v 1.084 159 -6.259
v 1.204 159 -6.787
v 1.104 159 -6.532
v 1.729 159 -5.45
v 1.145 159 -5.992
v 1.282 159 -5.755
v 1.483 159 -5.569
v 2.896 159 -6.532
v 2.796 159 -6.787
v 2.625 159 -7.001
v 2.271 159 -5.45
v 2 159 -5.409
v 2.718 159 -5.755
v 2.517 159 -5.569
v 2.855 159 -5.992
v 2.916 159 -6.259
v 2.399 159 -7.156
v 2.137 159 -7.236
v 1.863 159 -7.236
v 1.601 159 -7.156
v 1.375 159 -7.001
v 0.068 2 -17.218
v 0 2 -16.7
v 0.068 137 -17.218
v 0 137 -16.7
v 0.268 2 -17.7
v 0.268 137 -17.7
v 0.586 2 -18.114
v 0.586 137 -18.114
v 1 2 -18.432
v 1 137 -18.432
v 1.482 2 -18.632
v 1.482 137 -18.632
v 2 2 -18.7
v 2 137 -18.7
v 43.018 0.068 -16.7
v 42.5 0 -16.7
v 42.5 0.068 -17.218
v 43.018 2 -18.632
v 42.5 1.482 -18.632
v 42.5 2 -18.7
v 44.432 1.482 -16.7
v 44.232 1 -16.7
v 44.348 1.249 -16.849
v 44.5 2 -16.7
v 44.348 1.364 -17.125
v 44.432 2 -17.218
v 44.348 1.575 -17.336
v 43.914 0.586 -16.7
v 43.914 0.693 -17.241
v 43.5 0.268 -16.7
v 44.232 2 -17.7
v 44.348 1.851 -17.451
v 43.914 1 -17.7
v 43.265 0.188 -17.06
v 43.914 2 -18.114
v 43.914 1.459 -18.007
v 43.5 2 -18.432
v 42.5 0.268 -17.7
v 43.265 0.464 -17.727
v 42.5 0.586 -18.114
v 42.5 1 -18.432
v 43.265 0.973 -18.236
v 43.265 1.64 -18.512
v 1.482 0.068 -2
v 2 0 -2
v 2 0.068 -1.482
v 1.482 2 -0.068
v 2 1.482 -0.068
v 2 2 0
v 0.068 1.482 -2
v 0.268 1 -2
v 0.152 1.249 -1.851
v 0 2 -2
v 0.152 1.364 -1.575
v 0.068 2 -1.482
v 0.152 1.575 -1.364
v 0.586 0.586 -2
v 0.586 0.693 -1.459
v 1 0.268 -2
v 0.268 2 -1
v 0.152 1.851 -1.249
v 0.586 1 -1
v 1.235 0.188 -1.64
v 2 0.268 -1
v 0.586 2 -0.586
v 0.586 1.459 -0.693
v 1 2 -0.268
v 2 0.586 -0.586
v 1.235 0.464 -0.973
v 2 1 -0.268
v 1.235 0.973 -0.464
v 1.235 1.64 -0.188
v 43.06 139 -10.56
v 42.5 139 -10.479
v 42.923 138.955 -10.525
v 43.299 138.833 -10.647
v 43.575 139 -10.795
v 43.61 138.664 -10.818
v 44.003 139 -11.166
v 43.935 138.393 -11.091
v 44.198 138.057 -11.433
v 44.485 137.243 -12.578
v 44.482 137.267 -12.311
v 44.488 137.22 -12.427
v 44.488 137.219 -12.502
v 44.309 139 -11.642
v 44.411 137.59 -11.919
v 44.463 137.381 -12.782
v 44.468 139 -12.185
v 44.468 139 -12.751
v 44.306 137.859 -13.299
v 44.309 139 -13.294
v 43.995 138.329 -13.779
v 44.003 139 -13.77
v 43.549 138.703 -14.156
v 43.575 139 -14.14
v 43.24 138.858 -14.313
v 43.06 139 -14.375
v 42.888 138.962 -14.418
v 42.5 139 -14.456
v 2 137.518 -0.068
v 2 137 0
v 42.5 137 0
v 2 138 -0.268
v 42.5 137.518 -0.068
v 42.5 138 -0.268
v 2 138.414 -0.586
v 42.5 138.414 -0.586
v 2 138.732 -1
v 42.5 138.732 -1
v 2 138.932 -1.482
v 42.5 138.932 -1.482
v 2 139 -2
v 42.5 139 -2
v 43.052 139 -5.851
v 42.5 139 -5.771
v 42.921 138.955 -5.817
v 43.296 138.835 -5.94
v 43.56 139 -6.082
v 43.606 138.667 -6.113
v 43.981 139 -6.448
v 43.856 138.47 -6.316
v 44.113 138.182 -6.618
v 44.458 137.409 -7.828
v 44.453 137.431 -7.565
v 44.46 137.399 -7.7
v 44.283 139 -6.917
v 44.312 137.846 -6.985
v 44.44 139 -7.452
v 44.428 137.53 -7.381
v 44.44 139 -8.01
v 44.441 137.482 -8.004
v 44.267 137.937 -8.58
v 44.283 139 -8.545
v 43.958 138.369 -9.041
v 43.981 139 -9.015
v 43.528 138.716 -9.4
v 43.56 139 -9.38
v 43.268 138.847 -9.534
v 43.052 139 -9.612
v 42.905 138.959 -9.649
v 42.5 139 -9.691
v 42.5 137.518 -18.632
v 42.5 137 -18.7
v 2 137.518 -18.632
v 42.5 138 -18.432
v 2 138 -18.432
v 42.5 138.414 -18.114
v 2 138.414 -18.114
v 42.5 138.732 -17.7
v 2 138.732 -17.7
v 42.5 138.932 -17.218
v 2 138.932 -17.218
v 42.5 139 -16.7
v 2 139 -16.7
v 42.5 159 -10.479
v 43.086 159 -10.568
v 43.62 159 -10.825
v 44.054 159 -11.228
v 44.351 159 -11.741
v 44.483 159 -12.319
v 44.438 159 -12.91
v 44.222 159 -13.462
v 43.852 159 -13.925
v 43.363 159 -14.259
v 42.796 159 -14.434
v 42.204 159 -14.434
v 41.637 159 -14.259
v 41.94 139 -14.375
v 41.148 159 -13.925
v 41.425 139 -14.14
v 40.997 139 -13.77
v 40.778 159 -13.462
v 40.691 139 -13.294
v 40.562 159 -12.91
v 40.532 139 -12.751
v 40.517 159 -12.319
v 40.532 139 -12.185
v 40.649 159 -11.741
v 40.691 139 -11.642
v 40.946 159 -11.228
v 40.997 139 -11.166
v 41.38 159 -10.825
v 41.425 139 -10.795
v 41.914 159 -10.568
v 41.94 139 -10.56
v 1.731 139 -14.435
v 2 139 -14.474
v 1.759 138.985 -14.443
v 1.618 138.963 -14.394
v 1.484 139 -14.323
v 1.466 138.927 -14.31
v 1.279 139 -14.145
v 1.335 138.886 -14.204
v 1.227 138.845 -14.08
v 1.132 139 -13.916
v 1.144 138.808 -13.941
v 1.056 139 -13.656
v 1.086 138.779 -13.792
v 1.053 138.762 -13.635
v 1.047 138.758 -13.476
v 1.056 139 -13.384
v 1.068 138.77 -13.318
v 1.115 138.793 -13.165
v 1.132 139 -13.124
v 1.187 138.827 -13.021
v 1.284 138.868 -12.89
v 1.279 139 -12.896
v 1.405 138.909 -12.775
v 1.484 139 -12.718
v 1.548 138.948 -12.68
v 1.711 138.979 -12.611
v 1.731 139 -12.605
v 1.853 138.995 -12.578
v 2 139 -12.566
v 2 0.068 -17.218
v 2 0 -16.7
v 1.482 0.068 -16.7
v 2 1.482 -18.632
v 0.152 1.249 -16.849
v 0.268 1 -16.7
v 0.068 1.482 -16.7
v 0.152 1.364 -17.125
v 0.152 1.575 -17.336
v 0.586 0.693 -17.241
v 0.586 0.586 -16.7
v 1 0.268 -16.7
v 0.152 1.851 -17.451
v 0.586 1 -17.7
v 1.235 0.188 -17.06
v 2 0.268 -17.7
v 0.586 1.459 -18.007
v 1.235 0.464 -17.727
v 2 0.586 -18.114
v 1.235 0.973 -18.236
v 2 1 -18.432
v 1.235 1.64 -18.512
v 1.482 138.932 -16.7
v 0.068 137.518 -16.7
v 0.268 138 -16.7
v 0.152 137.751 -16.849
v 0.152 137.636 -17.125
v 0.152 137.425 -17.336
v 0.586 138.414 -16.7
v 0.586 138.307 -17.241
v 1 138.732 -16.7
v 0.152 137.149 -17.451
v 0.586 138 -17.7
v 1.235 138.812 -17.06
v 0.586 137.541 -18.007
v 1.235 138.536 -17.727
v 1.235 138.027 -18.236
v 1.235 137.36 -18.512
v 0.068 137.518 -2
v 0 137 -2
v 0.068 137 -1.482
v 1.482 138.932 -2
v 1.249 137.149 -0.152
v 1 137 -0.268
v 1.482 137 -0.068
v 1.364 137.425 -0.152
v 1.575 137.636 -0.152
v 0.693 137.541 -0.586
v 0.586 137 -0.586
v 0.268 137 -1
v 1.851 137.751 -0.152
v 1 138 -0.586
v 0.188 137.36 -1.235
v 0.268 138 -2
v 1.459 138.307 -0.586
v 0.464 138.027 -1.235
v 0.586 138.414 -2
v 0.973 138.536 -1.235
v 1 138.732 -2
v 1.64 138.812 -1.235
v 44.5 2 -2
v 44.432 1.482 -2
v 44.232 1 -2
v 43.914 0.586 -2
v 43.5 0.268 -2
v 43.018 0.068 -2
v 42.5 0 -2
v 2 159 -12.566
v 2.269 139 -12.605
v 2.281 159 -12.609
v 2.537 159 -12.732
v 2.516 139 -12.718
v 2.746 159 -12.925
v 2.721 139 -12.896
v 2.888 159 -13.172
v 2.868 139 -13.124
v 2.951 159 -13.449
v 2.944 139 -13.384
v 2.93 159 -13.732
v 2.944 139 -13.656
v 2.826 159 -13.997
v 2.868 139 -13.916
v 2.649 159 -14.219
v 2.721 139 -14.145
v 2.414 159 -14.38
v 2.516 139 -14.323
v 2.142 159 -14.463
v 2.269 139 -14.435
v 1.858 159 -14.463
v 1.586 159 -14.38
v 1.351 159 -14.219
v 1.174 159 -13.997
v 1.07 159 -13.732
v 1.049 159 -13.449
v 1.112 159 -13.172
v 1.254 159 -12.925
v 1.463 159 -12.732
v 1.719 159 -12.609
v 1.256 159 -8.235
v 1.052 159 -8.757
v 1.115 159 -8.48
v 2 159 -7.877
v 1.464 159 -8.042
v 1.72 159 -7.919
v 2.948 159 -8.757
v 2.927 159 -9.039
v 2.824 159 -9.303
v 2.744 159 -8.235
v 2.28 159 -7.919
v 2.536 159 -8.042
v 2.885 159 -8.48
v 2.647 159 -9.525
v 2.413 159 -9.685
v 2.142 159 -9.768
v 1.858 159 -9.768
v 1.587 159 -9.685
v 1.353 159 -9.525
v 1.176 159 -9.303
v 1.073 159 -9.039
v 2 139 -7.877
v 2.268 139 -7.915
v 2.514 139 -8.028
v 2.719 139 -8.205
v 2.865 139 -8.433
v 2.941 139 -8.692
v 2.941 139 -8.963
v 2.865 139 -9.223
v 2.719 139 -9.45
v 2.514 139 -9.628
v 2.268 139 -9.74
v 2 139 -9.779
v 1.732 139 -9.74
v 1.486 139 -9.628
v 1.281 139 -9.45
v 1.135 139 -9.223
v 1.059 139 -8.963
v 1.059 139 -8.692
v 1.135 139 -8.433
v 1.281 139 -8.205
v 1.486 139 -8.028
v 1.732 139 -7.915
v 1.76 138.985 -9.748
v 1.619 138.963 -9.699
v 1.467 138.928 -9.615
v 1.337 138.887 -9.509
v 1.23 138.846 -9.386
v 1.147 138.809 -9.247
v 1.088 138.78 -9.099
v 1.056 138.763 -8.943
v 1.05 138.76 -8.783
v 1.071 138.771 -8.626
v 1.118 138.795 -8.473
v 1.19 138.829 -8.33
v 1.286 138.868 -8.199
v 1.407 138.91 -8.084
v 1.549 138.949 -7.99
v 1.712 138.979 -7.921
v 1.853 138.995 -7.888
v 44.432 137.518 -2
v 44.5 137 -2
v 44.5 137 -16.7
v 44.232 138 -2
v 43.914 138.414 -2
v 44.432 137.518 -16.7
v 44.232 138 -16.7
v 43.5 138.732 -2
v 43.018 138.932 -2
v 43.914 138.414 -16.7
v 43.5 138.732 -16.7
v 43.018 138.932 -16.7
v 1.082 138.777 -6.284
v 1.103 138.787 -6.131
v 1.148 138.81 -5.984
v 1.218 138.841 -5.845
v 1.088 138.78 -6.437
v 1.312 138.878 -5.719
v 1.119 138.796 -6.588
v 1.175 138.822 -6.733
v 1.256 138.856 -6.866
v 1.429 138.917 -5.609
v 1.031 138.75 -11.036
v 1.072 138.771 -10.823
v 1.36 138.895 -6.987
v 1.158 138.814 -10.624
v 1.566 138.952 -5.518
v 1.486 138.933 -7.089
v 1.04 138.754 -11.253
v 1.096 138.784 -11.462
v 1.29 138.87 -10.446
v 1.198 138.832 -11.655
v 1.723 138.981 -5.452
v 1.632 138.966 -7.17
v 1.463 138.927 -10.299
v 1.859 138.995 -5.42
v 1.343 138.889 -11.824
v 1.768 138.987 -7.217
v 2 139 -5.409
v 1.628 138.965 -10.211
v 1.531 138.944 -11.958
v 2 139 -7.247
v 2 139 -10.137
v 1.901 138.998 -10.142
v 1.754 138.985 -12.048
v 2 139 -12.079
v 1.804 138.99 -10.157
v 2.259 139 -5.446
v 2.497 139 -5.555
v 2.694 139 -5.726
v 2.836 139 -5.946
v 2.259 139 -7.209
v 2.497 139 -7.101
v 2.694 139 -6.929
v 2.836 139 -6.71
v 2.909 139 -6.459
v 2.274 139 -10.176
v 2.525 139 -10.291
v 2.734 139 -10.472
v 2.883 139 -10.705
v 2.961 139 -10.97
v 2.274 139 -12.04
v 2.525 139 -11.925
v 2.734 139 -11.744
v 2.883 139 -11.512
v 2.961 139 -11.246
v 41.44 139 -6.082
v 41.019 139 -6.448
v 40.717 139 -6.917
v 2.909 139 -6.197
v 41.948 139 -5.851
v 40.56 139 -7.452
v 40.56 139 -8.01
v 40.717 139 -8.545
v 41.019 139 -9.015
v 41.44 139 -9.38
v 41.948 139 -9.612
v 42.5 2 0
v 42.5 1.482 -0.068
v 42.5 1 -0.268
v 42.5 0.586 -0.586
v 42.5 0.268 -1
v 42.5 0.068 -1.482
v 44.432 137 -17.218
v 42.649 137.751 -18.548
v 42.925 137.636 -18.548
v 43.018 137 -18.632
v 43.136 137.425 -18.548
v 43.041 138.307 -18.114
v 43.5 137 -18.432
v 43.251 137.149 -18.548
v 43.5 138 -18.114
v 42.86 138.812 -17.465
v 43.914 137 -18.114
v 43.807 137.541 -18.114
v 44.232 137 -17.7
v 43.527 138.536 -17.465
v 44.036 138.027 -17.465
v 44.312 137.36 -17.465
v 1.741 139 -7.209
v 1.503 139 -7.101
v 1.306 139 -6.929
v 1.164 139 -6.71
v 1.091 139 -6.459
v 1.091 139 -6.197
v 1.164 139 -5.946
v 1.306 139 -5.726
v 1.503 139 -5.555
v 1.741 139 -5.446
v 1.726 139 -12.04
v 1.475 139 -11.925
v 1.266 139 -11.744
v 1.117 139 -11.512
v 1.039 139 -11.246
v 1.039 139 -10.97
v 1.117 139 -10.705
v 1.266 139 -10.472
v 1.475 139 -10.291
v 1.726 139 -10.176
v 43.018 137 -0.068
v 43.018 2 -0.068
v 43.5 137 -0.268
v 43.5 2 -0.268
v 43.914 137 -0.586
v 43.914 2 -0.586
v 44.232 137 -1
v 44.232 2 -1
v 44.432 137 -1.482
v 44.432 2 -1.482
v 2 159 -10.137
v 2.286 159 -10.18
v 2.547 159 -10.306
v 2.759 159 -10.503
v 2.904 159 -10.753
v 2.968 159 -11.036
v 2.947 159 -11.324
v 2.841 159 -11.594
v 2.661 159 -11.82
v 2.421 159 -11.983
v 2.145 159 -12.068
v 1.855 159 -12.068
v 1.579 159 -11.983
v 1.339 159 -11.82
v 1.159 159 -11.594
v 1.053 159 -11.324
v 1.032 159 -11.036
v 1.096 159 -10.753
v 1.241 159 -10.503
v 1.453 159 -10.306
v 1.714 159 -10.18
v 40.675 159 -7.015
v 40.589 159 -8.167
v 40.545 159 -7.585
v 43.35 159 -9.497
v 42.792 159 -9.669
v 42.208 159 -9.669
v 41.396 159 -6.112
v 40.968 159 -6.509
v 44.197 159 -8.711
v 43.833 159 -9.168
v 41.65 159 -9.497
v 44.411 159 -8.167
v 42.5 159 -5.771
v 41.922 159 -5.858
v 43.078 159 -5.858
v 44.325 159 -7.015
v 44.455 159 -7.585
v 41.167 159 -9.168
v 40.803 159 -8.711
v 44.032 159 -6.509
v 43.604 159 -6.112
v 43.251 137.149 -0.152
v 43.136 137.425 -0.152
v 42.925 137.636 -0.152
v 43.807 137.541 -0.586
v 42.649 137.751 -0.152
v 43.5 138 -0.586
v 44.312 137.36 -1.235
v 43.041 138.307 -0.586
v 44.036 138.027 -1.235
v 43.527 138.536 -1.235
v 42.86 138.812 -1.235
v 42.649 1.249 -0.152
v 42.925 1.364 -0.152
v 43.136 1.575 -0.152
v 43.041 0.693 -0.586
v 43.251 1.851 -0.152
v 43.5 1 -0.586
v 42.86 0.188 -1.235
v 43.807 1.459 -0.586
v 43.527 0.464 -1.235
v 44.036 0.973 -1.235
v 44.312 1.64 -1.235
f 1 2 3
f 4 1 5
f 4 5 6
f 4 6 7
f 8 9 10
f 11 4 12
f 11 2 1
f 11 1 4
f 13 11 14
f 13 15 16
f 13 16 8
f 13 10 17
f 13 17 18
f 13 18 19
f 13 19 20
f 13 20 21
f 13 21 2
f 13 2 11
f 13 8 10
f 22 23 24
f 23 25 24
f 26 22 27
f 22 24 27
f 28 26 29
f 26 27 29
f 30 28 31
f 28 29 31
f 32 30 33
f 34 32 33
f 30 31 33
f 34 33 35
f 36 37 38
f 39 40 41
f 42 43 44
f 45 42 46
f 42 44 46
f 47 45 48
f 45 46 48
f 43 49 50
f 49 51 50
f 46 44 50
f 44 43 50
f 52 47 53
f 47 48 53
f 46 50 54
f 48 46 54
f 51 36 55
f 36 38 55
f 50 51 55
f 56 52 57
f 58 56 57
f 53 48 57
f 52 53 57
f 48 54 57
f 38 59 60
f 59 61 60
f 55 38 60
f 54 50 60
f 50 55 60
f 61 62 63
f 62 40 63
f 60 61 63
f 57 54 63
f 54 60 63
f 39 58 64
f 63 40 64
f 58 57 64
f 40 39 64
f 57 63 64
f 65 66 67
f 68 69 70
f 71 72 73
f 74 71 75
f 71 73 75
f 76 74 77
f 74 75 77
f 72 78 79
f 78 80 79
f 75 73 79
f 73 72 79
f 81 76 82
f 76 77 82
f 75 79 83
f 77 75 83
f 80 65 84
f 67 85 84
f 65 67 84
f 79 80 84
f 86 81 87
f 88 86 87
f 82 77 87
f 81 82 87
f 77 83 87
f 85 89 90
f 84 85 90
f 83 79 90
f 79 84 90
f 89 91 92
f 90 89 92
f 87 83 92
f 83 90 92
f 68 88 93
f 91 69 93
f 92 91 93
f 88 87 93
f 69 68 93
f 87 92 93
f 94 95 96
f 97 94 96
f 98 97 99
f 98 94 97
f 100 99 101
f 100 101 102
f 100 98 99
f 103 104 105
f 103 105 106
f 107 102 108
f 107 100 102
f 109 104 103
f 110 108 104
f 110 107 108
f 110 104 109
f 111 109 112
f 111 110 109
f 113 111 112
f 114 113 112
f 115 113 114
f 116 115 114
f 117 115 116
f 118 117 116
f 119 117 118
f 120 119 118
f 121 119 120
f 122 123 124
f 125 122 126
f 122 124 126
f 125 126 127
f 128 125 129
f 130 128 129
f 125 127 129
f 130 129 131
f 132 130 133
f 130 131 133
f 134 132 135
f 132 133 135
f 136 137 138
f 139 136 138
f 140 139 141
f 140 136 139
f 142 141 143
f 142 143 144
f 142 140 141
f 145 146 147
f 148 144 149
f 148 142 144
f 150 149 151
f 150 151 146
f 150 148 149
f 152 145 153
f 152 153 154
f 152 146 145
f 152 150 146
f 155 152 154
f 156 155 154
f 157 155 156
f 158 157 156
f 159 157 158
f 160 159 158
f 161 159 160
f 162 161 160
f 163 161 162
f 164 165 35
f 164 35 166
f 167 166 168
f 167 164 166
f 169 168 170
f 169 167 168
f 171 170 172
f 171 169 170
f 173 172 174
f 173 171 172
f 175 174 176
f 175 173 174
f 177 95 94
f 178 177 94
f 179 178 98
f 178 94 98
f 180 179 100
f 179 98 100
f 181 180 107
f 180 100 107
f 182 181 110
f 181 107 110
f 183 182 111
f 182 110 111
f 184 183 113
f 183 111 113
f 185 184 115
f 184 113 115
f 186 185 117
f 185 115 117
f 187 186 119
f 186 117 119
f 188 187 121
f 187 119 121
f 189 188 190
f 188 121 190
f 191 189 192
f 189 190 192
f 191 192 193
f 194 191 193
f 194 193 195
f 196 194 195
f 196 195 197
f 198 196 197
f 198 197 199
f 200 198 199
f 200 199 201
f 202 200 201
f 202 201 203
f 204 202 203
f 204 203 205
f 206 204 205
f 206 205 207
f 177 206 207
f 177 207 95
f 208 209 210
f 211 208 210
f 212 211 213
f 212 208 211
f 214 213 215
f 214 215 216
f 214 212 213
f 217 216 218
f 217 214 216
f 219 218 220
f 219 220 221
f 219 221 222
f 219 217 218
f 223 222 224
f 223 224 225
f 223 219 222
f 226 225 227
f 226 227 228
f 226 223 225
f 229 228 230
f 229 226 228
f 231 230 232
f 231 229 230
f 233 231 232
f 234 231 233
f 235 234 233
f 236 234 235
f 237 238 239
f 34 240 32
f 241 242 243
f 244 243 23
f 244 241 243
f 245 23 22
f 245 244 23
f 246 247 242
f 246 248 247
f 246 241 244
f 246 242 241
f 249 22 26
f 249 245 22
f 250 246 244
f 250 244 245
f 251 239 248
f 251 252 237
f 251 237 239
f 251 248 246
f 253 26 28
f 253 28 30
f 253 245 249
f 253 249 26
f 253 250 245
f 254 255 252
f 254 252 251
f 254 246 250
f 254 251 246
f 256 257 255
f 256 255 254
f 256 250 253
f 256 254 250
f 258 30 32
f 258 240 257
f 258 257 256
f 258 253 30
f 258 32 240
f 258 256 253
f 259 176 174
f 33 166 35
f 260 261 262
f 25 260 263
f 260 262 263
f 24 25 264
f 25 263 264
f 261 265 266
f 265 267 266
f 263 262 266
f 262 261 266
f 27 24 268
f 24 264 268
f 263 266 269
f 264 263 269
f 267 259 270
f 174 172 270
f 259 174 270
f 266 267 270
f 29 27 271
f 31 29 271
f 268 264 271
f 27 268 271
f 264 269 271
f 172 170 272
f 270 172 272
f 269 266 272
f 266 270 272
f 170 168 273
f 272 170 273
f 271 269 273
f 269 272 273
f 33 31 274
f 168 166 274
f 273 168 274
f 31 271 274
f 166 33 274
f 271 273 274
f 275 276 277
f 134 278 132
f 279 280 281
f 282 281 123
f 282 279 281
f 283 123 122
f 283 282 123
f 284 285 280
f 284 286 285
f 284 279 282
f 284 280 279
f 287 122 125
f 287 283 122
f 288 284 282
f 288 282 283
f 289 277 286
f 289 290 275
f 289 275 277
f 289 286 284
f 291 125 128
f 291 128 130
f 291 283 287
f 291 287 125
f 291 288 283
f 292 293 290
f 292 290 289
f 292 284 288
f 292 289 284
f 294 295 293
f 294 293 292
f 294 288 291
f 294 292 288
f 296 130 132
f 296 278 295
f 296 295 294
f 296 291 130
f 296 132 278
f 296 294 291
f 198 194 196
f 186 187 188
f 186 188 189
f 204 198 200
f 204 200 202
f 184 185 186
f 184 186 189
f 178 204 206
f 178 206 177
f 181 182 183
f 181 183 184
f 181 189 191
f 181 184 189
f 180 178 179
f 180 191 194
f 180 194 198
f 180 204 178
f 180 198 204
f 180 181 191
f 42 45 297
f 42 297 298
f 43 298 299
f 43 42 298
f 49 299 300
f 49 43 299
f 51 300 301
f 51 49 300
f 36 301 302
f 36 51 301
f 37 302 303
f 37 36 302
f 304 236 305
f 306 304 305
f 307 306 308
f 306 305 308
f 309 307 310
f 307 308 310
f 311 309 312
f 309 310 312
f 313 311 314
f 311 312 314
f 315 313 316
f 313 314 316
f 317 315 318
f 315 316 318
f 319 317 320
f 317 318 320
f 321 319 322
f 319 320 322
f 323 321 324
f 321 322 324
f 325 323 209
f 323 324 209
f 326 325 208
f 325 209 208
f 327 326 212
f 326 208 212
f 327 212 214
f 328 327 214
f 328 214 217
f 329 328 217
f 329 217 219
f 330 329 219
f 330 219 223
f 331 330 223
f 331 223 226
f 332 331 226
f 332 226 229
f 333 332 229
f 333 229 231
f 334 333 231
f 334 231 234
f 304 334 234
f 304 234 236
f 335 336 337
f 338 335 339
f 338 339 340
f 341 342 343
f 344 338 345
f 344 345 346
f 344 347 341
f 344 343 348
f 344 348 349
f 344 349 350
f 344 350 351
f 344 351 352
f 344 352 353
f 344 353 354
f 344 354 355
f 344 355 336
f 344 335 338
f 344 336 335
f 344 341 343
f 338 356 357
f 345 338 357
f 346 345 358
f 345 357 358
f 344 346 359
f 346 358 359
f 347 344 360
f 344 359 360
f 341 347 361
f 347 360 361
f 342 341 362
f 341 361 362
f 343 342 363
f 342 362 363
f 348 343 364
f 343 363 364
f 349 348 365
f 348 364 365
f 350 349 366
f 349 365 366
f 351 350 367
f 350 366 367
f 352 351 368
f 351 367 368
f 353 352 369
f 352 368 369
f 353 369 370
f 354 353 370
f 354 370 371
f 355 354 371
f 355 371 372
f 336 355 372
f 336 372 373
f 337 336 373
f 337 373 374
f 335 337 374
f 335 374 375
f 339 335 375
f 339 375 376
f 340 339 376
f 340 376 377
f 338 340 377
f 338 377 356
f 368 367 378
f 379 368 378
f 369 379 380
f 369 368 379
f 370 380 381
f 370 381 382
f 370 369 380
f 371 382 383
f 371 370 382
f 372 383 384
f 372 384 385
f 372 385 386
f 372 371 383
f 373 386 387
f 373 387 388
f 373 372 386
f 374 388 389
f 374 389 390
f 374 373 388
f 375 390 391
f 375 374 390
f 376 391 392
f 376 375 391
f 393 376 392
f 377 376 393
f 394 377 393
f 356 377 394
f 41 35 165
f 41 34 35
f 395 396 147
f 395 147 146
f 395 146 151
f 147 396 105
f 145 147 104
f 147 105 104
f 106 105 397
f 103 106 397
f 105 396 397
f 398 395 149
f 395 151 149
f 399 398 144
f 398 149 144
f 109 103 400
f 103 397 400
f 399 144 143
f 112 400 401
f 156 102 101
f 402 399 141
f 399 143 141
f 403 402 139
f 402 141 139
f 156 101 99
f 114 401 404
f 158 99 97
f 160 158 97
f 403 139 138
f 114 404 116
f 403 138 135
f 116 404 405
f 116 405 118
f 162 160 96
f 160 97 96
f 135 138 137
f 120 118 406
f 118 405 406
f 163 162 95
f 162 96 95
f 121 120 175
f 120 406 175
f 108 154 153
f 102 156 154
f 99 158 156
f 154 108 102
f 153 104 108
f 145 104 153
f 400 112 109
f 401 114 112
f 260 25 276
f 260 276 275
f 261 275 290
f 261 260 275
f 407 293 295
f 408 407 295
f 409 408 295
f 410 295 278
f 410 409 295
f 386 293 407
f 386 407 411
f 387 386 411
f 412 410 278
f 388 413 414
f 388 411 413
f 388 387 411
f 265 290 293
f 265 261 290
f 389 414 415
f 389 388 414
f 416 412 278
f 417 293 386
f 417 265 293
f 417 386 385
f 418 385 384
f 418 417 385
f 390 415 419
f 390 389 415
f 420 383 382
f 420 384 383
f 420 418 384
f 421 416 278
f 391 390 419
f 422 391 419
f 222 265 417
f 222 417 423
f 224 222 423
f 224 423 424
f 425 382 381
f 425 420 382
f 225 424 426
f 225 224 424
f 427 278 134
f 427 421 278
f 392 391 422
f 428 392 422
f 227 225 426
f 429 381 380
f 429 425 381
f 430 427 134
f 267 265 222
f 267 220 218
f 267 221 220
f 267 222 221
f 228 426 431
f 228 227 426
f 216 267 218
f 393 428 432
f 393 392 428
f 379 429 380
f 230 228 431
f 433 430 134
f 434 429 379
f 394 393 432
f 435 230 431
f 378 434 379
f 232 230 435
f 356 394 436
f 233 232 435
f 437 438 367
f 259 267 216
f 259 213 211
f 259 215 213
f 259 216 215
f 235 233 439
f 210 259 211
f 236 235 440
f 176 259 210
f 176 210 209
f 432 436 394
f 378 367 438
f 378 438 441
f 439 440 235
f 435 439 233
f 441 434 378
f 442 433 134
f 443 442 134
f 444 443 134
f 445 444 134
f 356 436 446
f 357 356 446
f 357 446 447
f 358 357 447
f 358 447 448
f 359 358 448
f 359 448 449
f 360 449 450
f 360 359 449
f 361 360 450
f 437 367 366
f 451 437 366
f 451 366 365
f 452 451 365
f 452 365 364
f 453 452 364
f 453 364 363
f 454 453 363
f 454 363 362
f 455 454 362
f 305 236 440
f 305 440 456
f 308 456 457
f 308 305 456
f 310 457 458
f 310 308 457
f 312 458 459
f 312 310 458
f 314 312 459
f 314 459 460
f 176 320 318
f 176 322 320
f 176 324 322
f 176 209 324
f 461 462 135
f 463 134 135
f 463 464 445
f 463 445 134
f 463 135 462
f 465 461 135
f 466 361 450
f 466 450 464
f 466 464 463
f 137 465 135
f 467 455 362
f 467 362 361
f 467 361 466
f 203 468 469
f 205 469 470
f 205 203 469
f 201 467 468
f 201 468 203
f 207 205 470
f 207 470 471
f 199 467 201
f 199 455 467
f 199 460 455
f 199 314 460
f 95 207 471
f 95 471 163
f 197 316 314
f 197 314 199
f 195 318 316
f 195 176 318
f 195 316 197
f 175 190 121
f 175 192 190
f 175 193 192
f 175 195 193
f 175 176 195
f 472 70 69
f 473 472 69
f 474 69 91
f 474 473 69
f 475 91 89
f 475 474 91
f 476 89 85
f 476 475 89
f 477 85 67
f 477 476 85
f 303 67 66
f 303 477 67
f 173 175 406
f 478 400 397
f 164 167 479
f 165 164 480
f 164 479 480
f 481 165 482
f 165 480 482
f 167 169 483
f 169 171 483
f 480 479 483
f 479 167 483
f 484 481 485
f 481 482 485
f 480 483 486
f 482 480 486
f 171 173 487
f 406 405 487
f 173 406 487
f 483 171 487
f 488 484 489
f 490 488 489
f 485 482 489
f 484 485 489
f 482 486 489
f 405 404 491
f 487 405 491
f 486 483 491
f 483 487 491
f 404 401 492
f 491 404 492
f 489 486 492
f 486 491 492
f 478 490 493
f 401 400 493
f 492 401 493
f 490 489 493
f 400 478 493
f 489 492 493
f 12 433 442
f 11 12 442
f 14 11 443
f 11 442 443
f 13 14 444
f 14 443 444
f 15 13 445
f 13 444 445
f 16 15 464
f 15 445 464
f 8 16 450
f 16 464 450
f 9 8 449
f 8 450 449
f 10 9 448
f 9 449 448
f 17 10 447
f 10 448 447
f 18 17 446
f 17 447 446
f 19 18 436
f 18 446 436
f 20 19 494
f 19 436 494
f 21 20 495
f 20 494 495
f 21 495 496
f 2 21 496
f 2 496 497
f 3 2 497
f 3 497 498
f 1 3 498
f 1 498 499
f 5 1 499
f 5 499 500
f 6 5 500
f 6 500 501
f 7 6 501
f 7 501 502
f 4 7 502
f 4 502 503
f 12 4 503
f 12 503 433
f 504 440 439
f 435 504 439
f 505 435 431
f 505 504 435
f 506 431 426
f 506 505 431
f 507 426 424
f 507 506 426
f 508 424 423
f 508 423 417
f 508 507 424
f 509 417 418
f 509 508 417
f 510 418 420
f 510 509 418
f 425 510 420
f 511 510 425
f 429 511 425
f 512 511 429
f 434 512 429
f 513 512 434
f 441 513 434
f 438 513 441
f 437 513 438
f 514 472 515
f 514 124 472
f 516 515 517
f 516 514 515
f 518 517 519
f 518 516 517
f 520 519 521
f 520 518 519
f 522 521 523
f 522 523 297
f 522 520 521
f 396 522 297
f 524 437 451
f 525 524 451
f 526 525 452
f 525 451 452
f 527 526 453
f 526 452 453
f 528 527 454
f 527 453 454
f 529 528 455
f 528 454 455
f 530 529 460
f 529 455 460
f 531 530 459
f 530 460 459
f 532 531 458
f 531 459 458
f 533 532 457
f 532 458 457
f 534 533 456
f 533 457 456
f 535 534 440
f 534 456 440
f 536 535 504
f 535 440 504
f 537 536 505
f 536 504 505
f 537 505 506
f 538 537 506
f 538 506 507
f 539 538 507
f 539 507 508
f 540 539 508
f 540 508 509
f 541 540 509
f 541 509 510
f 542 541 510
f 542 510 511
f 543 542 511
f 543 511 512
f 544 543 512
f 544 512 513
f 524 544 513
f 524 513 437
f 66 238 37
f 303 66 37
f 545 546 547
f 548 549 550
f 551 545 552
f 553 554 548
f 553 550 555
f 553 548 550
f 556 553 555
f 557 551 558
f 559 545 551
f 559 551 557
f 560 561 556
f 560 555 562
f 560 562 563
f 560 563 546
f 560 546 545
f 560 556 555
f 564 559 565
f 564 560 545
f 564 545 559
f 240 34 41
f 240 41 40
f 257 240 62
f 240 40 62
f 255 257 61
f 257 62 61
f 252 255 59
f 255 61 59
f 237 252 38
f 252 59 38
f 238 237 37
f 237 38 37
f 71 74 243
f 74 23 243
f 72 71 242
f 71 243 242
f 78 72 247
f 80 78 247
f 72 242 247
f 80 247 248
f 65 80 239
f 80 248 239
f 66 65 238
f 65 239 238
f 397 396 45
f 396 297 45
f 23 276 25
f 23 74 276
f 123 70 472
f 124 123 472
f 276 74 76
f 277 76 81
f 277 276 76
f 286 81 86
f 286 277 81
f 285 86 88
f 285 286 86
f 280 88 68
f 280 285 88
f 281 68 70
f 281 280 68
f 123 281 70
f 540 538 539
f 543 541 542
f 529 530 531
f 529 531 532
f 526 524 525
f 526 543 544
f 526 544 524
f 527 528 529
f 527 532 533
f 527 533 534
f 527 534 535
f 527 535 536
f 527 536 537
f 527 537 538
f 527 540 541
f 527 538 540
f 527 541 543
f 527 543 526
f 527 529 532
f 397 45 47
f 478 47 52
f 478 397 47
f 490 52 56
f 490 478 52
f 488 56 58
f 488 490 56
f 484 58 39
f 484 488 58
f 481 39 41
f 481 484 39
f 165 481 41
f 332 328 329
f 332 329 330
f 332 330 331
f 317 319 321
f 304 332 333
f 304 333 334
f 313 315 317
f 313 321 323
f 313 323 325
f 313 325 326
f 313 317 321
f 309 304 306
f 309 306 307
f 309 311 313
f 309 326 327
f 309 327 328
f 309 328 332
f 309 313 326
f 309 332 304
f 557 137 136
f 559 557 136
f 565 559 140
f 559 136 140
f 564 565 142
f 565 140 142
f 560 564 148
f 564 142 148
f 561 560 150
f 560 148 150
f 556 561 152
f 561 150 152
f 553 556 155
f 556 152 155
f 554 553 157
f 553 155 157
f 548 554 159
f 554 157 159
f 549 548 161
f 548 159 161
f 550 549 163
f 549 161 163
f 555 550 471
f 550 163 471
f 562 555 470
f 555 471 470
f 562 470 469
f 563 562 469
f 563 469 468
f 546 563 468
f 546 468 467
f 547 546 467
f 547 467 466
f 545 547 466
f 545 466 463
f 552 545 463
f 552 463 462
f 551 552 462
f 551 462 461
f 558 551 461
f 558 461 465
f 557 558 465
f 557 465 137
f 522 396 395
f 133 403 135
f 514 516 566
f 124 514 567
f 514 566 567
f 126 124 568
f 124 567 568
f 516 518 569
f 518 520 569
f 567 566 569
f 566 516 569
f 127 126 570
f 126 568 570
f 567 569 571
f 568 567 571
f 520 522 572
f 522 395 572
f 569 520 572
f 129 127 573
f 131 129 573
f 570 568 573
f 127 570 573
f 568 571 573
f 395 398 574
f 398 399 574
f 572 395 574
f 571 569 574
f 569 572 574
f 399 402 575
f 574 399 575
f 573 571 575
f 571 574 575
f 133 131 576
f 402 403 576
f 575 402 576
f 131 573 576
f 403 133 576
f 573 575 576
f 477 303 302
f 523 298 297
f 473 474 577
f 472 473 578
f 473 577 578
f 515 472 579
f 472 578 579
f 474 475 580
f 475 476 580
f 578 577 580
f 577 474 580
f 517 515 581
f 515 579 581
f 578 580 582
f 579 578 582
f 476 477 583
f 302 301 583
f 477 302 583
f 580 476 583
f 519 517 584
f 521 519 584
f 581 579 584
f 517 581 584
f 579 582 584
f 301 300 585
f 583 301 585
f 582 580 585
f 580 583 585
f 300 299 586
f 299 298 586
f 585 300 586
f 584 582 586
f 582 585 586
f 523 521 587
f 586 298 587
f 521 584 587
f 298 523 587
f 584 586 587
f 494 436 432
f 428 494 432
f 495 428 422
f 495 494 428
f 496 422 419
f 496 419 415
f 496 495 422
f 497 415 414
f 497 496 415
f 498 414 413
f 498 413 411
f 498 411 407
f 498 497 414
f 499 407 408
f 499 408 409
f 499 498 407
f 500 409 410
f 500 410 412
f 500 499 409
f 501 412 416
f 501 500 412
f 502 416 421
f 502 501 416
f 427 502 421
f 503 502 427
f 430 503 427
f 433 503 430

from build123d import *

# Parameters (mm, degrees)
SKETCH1_W                       = 44.5
SKETCH1_H                       = 18.7
BOSS_EXTRUDE1_DEPTH             = 139
FILLET1_R                       = 2
SKETCH2_R                       = 1.960015311
SKETCH2_R_2                     = 1.988264752
SKETCH2_R_3                     = 0.918642691
SKETCH2_R_4                     = 0.97117112
SKETCH2_R_5                     = 0.953860003
SKETCH2_R_6                     = 0.951024876
BOSS_EXTRUDE2_DEPTH             = 20
BOSS_EXTRUDE2_DIRECTION_2_REACH = 149.143


with BuildPart() as part:
    # Sketch1 → Boss-Extrude1 (new body)
    with BuildSketch(Plane(origin=(0, 0, 0), x_dir=(1, 0, 0), z_dir=(0, 1, 0))):
        with Locations((22.25, 9.35)):
            Rectangle(SKETCH1_W, SKETCH1_H)
    extrude(amount=BOSS_EXTRUDE1_DEPTH)

    # Fillet1
    fillet1_edges = [part.edges().sort_by_distance(p)[0] for p in [
        (44.5, 139, -9.35),
        (22.25, 139, -18.7),
        (0, 139, -9.35),
        (22.25, 0, -18.7),
        (44.5, 0, -9.35),
        (22.25, 0, 0),
        (0, 0, -9.35),
        (0, 69.5, -18.7),
        (44.5, 69.5, -18.7),
        (44.5, 69.5, 0),
        (0, 69.5, 0),
        (22.25, 139, 0),
    ]]
    fillet(fillet1_edges, radius=FILLET1_R)

    # Sketch2 → Boss-Extrude2 (add)
    with BuildSketch(Plane(origin=(0, 139, 0), x_dir=(1, 0, 0), z_dir=(0, 1, 0))):
        with Locations(Location((42.5, 7.731273805, 0), (0, 0, 270))):
            Circle(SKETCH2_R)
        with Locations(Location((42.5, 12.467660333, 0), (0, 0, 270))):
            Circle(SKETCH2_R_2)
        with Locations(Location((2, 6.327900019, 0), (0, 0, 270))):
            Circle(SKETCH2_R_3)
        with Locations(Location((2, 11.108141978, 0), (0, 0, 270))):
            Circle(SKETCH2_R_4)
        with Locations(Location((2, 13.520190672, 0), (0, 0, 270))):
            Circle(SKETCH2_R_5)
        with Locations(Location((2, 8.827659575, 0), (0, 0, 270))):
            Circle(SKETCH2_R_6)
    extrude(amount=BOSS_EXTRUDE2_DEPTH)

    # Sketch2 → Boss-Extrude2 direction 2 (add, up to next)
    with BuildSketch(Plane(origin=(0, 139, 0), x_dir=(1, 0, 0), z_dir=(0, 1, 0)), mode=Mode.PRIVATE) as boss_extrude2_direction_2_sk1:
        with Locations(Location((42.5, 7.731273805, 0), (0, 0, 270))):
            Circle(SKETCH2_R)
    boss_extrude2_direction_2_tool1 = extrude(boss_extrude2_direction_2_sk1.sketch, amount=-BOSS_EXTRUDE2_DIRECTION_2_REACH, mode=Mode.PRIVATE) - part.part
    # Sketch2 → Boss-Extrude2 direction 2 (add, up to next)
    with BuildSketch(Plane(origin=(0, 139, 0), x_dir=(1, 0, 0), z_dir=(0, 1, 0)), mode=Mode.PRIVATE) as boss_extrude2_direction_2_sk2:
        with Locations(Location((42.5, 12.467660333, 0), (0, 0, 270))):
            Circle(SKETCH2_R_2)
    boss_extrude2_direction_2_tool2 = extrude(boss_extrude2_direction_2_sk2.sketch, amount=-BOSS_EXTRUDE2_DIRECTION_2_REACH, mode=Mode.PRIVATE) - part.part
    # Sketch2 → Boss-Extrude2 direction 2 (add, up to next)
    with BuildSketch(Plane(origin=(0, 139, 0), x_dir=(1, 0, 0), z_dir=(0, 1, 0)), mode=Mode.PRIVATE) as boss_extrude2_direction_2_sk3:
        with Locations(Location((2, 6.327900019, 0), (0, 0, 270))):
            Circle(SKETCH2_R_3)
    boss_extrude2_direction_2_tool3 = extrude(boss_extrude2_direction_2_sk3.sketch, amount=-BOSS_EXTRUDE2_DIRECTION_2_REACH, mode=Mode.PRIVATE) - part.part
    # Sketch2 → Boss-Extrude2 direction 2 (add, up to next)
    with BuildSketch(Plane(origin=(0, 139, 0), x_dir=(1, 0, 0), z_dir=(0, 1, 0)), mode=Mode.PRIVATE) as boss_extrude2_direction_2_sk4:
        with Locations(Location((2, 11.108141978, 0), (0, 0, 270))):
            Circle(SKETCH2_R_4)
    boss_extrude2_direction_2_tool4 = extrude(boss_extrude2_direction_2_sk4.sketch, amount=-BOSS_EXTRUDE2_DIRECTION_2_REACH, mode=Mode.PRIVATE) - part.part
    # Sketch2 → Boss-Extrude2 direction 2 (add, up to next)
    with BuildSketch(Plane(origin=(0, 139, 0), x_dir=(1, 0, 0), z_dir=(0, 1, 0)), mode=Mode.PRIVATE) as boss_extrude2_direction_2_sk5:
        with Locations(Location((2, 13.520190672, 0), (0, 0, 270))):
            Circle(SKETCH2_R_5)
    boss_extrude2_direction_2_tool5 = extrude(boss_extrude2_direction_2_sk5.sketch, amount=-BOSS_EXTRUDE2_DIRECTION_2_REACH, mode=Mode.PRIVATE) - part.part
    # Sketch2 → Boss-Extrude2 direction 2 (add, up to next)
    with BuildSketch(Plane(origin=(0, 139, 0), x_dir=(1, 0, 0), z_dir=(0, 1, 0)), mode=Mode.PRIVATE) as boss_extrude2_direction_2_sk6:
        with Locations(Location((2, 8.827659575, 0), (0, 0, 270))):
            Circle(SKETCH2_R_6)
    boss_extrude2_direction_2_tool6 = extrude(boss_extrude2_direction_2_sk6.sketch, amount=-BOSS_EXTRUDE2_DIRECTION_2_REACH, mode=Mode.PRIVATE) - part.part
    add(boss_extrude2_direction_2_tool1.solids().sort_by_distance((42.5, 139, -7.731274))[0])
    add(boss_extrude2_direction_2_tool2.solids().sort_by_distance((42.5, 139, -12.46766))[0])
    add(boss_extrude2_direction_2_tool3.solids().sort_by_distance((2, 139, -6.3279))[0])
    add(boss_extrude2_direction_2_tool4.solids().sort_by_distance((2, 139, -11.108142))[0])
    add(boss_extrude2_direction_2_tool5.solids().sort_by_distance((2, 139, -13.520191))[0])
    add(boss_extrude2_direction_2_tool6.solids().sort_by_distance((2, 139, -8.82766))[0])


solid = part.part
